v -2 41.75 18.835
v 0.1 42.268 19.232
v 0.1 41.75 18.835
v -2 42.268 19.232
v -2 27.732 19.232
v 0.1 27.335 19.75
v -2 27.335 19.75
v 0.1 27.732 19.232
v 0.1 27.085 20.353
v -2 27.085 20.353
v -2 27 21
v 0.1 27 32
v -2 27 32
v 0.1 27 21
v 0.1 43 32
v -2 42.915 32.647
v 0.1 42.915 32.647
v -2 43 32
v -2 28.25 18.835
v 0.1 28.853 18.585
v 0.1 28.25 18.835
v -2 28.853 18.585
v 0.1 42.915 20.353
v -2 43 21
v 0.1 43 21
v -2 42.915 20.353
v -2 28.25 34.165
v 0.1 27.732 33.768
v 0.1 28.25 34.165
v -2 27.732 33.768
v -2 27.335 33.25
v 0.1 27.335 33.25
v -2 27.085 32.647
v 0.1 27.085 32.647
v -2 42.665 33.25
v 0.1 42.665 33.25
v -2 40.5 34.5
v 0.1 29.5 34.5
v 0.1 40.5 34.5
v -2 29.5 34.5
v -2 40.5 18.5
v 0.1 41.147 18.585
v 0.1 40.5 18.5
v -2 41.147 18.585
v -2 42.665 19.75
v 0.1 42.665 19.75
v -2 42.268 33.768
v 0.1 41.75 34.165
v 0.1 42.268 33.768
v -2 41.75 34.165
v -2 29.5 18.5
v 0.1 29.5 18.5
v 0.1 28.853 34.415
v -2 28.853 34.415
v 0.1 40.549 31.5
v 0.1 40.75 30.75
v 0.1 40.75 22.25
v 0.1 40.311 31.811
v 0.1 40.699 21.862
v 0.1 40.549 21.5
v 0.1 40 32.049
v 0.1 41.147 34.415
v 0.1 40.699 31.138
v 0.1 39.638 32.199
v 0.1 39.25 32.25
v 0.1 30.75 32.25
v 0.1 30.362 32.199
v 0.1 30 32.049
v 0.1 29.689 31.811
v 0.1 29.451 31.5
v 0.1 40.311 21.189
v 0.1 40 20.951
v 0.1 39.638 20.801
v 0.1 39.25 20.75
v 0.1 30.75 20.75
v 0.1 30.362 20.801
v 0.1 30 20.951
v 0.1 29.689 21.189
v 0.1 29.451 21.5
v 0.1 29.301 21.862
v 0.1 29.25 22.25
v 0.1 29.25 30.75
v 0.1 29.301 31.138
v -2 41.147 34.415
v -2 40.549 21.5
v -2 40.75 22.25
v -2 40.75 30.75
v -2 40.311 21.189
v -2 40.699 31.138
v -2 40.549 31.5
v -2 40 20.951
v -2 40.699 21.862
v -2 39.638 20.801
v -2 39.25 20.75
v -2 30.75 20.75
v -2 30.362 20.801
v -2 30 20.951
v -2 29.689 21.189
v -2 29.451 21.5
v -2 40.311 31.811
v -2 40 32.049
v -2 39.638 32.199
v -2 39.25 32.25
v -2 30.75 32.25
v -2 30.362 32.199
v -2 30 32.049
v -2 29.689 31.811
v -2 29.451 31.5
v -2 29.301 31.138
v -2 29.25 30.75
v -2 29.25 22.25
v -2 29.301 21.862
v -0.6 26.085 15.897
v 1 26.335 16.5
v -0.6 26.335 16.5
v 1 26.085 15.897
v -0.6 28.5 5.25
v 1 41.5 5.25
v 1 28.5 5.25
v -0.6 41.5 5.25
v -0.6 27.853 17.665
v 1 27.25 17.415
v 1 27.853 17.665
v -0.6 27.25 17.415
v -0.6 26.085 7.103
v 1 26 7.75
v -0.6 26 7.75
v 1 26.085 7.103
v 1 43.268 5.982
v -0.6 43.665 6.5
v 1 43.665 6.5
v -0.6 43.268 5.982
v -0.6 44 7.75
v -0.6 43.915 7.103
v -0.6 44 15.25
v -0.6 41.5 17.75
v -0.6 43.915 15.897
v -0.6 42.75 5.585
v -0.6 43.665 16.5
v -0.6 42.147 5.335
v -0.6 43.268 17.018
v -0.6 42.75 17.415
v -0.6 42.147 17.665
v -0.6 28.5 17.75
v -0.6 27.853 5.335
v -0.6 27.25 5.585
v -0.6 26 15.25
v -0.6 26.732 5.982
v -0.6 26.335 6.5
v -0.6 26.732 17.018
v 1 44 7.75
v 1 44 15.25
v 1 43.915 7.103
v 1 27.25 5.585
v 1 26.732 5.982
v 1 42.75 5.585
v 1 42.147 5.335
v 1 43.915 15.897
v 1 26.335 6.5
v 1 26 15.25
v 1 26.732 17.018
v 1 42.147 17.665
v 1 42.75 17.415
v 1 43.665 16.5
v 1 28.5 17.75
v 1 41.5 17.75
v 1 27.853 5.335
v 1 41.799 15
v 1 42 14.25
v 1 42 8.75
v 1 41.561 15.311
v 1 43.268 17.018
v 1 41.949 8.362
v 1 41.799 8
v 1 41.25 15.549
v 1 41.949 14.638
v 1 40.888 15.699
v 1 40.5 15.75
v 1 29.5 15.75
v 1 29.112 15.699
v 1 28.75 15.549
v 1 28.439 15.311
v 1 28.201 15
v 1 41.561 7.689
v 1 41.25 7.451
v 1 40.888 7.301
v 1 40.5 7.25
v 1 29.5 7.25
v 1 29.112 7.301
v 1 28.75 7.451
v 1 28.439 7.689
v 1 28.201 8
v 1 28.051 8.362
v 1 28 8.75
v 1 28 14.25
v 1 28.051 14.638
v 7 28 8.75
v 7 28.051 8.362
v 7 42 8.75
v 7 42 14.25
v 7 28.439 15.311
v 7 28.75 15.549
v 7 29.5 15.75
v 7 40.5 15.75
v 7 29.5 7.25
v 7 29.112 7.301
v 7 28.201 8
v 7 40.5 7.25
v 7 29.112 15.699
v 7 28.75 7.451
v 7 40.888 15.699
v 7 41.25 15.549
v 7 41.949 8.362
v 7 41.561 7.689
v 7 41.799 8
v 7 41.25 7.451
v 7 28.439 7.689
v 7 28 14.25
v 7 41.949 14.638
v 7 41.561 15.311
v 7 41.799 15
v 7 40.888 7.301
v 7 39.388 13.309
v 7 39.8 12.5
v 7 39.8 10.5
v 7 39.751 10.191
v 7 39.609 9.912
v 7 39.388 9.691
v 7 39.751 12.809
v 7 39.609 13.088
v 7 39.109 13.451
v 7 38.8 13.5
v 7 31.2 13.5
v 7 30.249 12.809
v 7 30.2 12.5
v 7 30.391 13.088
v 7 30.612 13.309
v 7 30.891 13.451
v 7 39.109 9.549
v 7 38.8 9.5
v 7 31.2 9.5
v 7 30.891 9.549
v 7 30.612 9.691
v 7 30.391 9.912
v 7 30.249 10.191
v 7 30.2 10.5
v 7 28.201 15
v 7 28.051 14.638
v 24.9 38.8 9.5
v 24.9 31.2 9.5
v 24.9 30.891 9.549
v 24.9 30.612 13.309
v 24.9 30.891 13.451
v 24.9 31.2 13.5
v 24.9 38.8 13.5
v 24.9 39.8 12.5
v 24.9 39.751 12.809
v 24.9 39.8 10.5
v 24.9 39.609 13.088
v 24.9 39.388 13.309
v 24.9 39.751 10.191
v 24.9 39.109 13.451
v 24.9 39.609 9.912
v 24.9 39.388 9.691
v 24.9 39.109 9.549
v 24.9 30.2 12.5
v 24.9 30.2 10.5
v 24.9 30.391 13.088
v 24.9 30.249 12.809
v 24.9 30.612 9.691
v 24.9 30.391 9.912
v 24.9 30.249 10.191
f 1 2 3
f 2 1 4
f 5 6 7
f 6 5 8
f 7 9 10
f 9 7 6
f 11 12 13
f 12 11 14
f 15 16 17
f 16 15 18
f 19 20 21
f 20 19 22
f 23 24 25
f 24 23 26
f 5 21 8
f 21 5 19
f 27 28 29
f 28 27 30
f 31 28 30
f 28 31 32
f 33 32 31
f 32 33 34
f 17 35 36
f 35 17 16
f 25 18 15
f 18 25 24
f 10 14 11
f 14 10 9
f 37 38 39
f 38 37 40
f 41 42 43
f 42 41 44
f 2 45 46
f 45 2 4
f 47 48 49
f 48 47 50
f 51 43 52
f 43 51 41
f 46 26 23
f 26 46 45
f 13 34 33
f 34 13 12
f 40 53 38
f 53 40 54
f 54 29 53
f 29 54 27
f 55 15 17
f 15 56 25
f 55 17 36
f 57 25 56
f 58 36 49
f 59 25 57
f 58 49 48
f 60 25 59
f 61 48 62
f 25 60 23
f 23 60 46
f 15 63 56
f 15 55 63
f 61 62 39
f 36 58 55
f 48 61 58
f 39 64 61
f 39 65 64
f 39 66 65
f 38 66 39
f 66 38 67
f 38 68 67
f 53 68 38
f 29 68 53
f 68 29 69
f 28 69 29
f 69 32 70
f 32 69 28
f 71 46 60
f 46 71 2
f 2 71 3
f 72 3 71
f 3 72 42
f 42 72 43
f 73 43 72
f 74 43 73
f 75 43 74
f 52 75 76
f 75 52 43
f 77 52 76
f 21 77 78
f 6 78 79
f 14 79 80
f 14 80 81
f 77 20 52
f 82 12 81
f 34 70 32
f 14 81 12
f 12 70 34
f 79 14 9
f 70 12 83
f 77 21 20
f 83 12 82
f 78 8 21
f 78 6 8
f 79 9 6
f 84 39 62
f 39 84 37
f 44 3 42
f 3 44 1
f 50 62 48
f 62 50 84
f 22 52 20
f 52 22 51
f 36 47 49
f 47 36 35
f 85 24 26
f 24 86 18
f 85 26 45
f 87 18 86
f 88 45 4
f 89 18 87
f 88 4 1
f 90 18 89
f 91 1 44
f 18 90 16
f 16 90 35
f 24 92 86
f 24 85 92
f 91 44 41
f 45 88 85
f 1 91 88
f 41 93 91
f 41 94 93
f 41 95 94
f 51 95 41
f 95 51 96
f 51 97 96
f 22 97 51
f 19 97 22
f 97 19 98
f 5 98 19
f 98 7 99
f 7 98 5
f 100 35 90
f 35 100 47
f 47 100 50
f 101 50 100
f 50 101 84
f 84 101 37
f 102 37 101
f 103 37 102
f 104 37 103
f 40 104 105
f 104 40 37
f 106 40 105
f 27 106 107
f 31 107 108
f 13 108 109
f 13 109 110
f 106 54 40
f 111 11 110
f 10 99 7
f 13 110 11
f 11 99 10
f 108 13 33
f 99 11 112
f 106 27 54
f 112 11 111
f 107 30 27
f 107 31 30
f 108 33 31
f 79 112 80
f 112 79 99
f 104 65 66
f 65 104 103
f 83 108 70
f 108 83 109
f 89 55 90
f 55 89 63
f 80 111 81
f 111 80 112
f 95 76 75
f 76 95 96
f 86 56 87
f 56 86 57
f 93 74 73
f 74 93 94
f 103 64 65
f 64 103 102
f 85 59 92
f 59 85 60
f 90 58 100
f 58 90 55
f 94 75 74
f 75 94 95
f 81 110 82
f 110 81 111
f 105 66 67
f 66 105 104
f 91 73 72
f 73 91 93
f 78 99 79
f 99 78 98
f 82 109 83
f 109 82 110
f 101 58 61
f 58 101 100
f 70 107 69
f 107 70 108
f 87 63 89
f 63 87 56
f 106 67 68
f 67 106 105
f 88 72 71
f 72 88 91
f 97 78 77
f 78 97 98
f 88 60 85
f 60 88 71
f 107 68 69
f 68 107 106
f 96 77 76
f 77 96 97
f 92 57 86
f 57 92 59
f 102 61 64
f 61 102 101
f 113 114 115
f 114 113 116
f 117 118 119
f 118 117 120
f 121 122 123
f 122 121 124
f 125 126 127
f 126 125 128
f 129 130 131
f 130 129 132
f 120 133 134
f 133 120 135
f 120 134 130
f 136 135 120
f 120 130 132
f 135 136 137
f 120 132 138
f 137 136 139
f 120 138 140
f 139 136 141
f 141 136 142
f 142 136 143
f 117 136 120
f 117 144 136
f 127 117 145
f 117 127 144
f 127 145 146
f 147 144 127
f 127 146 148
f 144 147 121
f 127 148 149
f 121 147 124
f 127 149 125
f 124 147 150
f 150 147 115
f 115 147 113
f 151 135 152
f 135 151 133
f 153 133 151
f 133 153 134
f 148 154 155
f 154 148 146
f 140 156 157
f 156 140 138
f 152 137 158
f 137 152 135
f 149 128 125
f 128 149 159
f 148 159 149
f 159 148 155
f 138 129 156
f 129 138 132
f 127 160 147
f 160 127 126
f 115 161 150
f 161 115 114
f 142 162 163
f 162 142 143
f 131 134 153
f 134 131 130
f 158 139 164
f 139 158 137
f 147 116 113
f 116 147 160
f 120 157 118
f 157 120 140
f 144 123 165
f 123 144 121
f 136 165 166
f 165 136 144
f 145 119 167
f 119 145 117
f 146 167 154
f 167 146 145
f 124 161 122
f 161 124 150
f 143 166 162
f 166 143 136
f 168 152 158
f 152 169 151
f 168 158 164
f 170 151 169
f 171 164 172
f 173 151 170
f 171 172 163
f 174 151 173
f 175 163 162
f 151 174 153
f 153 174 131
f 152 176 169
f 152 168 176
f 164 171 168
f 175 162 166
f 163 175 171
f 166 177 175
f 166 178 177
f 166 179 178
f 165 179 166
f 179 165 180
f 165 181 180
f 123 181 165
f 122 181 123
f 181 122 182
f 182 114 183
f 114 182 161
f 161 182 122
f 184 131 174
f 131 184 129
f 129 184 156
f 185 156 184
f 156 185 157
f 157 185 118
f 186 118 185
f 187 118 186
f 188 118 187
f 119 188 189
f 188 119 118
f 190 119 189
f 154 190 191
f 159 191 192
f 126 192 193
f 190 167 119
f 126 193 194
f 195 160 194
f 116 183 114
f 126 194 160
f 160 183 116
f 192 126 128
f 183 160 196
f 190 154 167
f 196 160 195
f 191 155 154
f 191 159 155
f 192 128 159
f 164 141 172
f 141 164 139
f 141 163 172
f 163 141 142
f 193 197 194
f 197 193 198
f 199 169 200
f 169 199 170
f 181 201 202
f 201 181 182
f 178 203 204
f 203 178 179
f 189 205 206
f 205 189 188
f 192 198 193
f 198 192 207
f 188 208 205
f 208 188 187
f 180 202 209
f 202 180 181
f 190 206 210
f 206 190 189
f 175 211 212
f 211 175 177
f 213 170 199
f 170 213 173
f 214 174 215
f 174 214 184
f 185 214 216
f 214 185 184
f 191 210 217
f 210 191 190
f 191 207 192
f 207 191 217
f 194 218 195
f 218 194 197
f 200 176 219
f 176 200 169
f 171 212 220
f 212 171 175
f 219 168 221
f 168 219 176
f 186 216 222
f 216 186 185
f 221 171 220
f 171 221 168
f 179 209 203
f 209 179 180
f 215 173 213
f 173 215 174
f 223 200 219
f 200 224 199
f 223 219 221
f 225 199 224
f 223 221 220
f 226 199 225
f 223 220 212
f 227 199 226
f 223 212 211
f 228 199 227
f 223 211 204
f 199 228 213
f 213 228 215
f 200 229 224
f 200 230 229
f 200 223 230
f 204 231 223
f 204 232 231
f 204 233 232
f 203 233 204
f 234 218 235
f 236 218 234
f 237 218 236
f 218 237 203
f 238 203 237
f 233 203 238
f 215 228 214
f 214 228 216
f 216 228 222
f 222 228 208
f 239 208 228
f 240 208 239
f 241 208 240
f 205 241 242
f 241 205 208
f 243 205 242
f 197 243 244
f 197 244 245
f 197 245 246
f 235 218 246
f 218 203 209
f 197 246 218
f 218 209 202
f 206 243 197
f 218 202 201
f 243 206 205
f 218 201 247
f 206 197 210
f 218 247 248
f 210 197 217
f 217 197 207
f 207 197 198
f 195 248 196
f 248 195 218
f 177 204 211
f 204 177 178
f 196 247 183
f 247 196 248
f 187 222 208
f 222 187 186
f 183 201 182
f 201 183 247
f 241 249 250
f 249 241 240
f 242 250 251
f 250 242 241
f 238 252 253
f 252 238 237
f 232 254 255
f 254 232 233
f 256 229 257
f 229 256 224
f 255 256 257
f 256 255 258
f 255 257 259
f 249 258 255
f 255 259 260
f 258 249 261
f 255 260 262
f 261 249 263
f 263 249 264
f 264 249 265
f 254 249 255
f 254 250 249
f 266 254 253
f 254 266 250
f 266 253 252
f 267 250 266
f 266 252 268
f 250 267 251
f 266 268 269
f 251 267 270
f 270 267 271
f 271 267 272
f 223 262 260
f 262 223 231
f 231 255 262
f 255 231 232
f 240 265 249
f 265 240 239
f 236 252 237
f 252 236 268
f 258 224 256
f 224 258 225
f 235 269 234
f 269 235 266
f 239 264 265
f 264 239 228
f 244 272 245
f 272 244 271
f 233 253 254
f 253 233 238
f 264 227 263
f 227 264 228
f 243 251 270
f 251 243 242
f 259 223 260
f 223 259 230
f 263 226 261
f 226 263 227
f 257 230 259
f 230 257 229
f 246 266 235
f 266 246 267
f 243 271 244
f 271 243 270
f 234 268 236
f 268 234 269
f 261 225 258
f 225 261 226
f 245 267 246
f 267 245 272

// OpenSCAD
// file: ../../00_common/parameters.scad
// =============================================================================
// OpenMotorBridge - Global CAD Parameters & Settings
// =============================================================================
// File: hardware/cad/scad/00_common/parameters.scad
// Description: Global dimensional constants, manufacturing clearances and
//              circle resolution ($fn) for all OpenSCAD modules.
// =============================================================================

// --- 1. Circle & Curve Resolution ---
$fn = 60; // Smooth cylinders and holes for high-quality MJF 3D printing

// --- 2. Central Main Box Dimensions (3-Tier Sandwich) ---
MAIN_BOX_OUTER_L      = 110.0; // Outer length in X (mm)
MAIN_BOX_OUTER_W      = 74.0;  // Outer width in Y (mm)
MAIN_BOX_LOWER_H      = 17.0;  // Lower case height in Z (mm)
MAIN_BOX_MID_H        = 15.0;  // Mid tray height in Z (mm)
MAIN_BOX_LID_H        = 4.0;   // Lid plate thickness in Z (mm)
MAIN_BOX_WALL         = 2.5;   // Nominal wall thickness (mm)
MAIN_BOX_CORNER_POST  = 7.0;   // Corner clamping screw post size (mm, for M3 hex nut pockets)

// --- 3. Satellite Pod Dimensions (Universal Enlarged Envelope) ---
POD_OUTER_L           = 150.0; // Outer length in X (mm, standardized for serial PCBA 03 + Cardo/Sena/OMM)
POD_OUTER_W           = 70.0;  // Outer width in Y (mm)
POD_OUTER_H           = 38.0;  // Outer height in Z (mm)
POD_WALL              = 3.5;   // Nominal wall thickness (mm)
POD_BULKHEAD_X        = 18.0;  // Partition bulkhead position in X (mm)
POD_CHAMBER_L         = 132.0; // Sliding chamber length in X (mm, clears 130mm sled + 2mm margin)
POD_CHAMBER_W         = 63.0;  // Sliding chamber width in Y (mm)
POD_CHAMBER_H         = 31.0;  // Sliding chamber height in Z (mm)

// --- 4. Pod Linear Guide Rails (Poka-Yoke Tongue & Groove) ---
POD_GROOVE_W          = 3.0;   // Internal guide groove width in Z (mm)
POD_GROOVE_DEPTH      = 1.5;   // Internal guide groove depth in Y (mm)
POD_GROOVE_LEFT_Z     = 10.0;  // Center height of left groove (mm)
POD_GROOVE_RIGHT_Z    = 18.0;  // Center height of right groove (mm, asym offset)

CARTRIDGE_TONGUE_W    = 2.6;   // Cartridge tongue rail height in Z (mm, 0.2mm clearance)
CARTRIDGE_TONGUE_PROT = 1.4;   // Cartridge tongue protrusion in Y (mm, 0.1mm clearance)
CARTRIDGE_CHAMFER_L   = 4.0;   // 30° lead-in chamfer nose length (mm)

// --- 5. Cartridge Dimensions (Enlarged Universal Sled) ---
CARTRIDGE_BASE_L      = 130.0; // Sled length in X (mm, accommodates PCBA 03 + OEM Cardo Air-Mount/Sena/OMM serial layout)
CARTRIDGE_BASE_W      = 58.0;  // Sled width in Y (mm)
CARTRIDGE_BASE_H      = 28.0;  // Sled height in Z (mm)
CARTRIDGE_FACE_L      = 4.0;   // Front faceplate thickness in X (mm)
CARTRIDGE_FACE_W      = 64.0;  // Front faceplate width in Y (mm)
CARTRIDGE_FACE_H      = 34.0;  // Front faceplate height in Z (mm)

// --- 5a. RF Interface & Sealing Dimensions ---
SMA_BORE_R            = 3.25;  // Ø 6.5 mm through-hole for standard SMA bulkhead
SMA_ORECESS_R         = 4.75;  // Ø 9.5 mm recess for waterproof silicone O-ring
SMA_ORECESS_DEPTH     = 1.2;   // 1.2 mm deep O-ring compression pocket

// --- 5b. Magnetic Anti-Theft Lock System ---
LATCH_PIVOT_X         = 65.0;  // Center pivot position along sled X (mm, centered on 130mm sled)
LATCH_MAGNET_X        = 53.0;  // Ferromagnetic anchor position along sled X (mm)
LATCH_TOOTH_X         = 77.0;  // Locking sawtooth pawl position along sled X (mm)
LATCH_ARM_H           = 6.0;   // Rocker lever height in Z (mm)
LATCH_ARM_THICK       = 2.6;   // Rocker beam thickness in Y (mm)
LATCH_MAGNET_PIN_DIA  = 6.2;   // Bore for Ø 6.0 mm steel dowel pin (mm)
LATCH_SPRING_DIA      = 3.8;   // Bore for Ø 3.5 mm return compression spring (mm)

// --- 6. Standard Captive Hex Nut Pockets (DIN 934 / DIN 985 with +0.2 mm MJF/FDM clearance) ---
NUT_M2_SW             = 4.2;   // M2 across flats (nominal 4.0 mm)
NUT_M2_H              = 1.8;   // M2 thickness (nominal 1.6 mm)
NUT_M2_5_SW           = 5.2;   // M2.5 across flats (nominal 5.0 mm)
NUT_M2_5_H            = 2.2;   // M2.5 thickness (nominal 2.0 mm)
NUT_M3_SW             = 5.7;   // M3 across flats (nominal 5.5 mm)
NUT_M3_H              = 2.6;   // M3 thickness (nominal 2.4 mm)
NUT_M4_SW             = 7.2;   // M4 across flats (nominal 7.0 mm)
NUT_M4_H              = 3.4;   // M4 thickness (nominal 3.2 mm)
NUT_M5_SW             = 8.2;   // M5 across flats (nominal 8.0 mm)
NUT_M5_H              = 4.2;   // M5 thickness (nominal 4.0 mm)

// Direct Plastic Thread-Forming / Self-Tapping Pilot Holes in PA12 (100% Soldering-Iron Free)
M2_PILOT_HOLE_R       = 0.85;  // Core hole for M2 screws in PA12 (Ø 1.7 mm)
M2_5_PILOT_HOLE_R     = 1.05;  // Core hole for M2.5 screws in PA12 (Ø 2.1 mm)
M3_PILOT_HOLE_R       = 1.25;  // Core hole for M3 screws in PA12 (Ø 2.5 mm)

// --- 7. Screw & Clearance Dimensions ---
M2_SCREW_HOLE_R       = 1.1;   // M2 clearance hole (r = 1.1 mm -> Ø 2.2 mm)
M2_5_SCREW_HOLE_R     = 1.4;   // M2.5 clearance hole (r = 1.4 mm -> Ø 2.8 mm)
M3_SCREW_HOLE_R       = 1.65;  // M3 clearance hole (r = 1.65 mm -> Ø 3.3 mm)
M4_SCREW_HOLE_R       = 2.2;   // M4 clearance hole (r = 2.2 mm -> Ø 4.4 mm)
M8_BORE_R             = 4.0;   // M8 cable through-bore (r = 4.0 mm -> Ø 8.0 mm)
M8_STUDS_OUTER_R      = 6.0;   // M8 neck outer radius (Ø 12.0 mm)

// --- 8. Universal Front Node Enclosure Dimensions (Type E: 98 x 68 x 25 mm) ---
FRONT_NODE_PCB_L      = 82.0;  // PCB length in X (mm, PCBA 05)
FRONT_NODE_PCB_W      = 50.0;  // PCB width in Y (mm, PCBA 05)
FRONT_NODE_PCB_H      = 1.6;   // PCB thickness in Z (mm)
FRONT_NODE_PCB_R      = 2.5;   // PCB corner radius (mm)

FRONT_NODE_CHAMBER_L  = 86.0;  // Internal chamber length in X (mm, 2mm margin per side)
FRONT_NODE_CHAMBER_W  = 56.0;  // Internal chamber width in Y (mm, 3mm margin per side)
FRONT_NODE_TUB_H      = 17.5;  // Lower tub depth in Z (mm)
FRONT_NODE_LID_H      = 7.5;   // Upper lid height in Z (mm)
FRONT_NODE_WALL       = 2.5;   // Wall thickness in HP MJF PA12 (mm)
FRONT_NODE_CORNER_R   = 4.0;   // Outer enclosure corner radius (mm)

FRONT_NODE_OUTER_L    = FRONT_NODE_CHAMBER_L + 2 * FRONT_NODE_WALL + 7.0; // 98.0 mm
FRONT_NODE_OUTER_W    = FRONT_NODE_CHAMBER_W + 2 * FRONT_NODE_WALL + 7.0; // 68.0 mm
FRONT_NODE_OUTER_H    = FRONT_NODE_TUB_H + FRONT_NODE_LID_H;              // 25.0 mm

// PCB Standoff Heights & Radii (100% Soldering-Iron Free)
FRONT_NODE_STANDOFF_H = 3.0;   // Height of PCB standoffs from floor (mm)
FRONT_NODE_STANDOFF_R = 3.0;   // Outer radius of M2.5 screw bosses (mm)
FRONT_NODE_CORE_HOLE_R= M2_5_PILOT_HOLE_R; // Core hole for direct M2.5 screw engagement (Ø 2.1 mm)

// AMPS 4-Hole Mounting Pattern (38 x 30 mm with DIN 934 M4 Captive Nut Pockets)
AMPS_SPACING_X        = 38.0;  // AMPS hole distance in X (mm)
AMPS_SPACING_Y        = 30.0;  // AMPS hole distance in Y (mm)
AMPS_NUT_SW           = NUT_M4_SW; // Captive M4 hex nut pocket across flats (7.2 mm)
AMPS_NUT_H            = NUT_M4_H;  // Captive M4 hex nut pocket depth (3.4 mm)

// Acoustic Vent for Knowles SPH0645 MEMS
FRONT_NODE_MIC_HOLE_R = 1.25;  // Sound canal radius (Ø 2.5 mm)
FRONT_NODE_MIC_MEMB_R = 3.0;   // Gore ePTFE membrane pocket radius (Ø 6.0 mm)
FRONT_NODE_MIC_MEMB_D = 0.8;   // Membrane pocket depth (mm)
// main file
// =============================================================================
// OpenMotorBridge - Satellite Pod: Rear Dual-Port Glands & Pockets (Port A & B)
// =============================================================================
// File: hardware/cad/scad/02_pod_base/parts/001_pod_rear_m8_gland.scad
// Description: Parametric features for Dual-Port architecture on pod rear wall:
//              - Port A: Square pass-through opening (11.5 x 11.5 mm) allowing
//                the massive square base of the M8 PCB receptacle to pass through
//                the rear wall without requiring extra pod length or interior space.
//              - Port B: Deep recessed USB-C socket pocket (14.0 x 8.5 x 7.0 mm)
//                with 45° lead-in chamfer and internal isolating sleeve boss.
//              - Sealing pocket for flush TPU dust plug (pod_base_usbc_cap_tpu).
// =============================================================================

include <../../00_common/parameters.scad>;

// 1. Port A: Low-Profile M8 Collar / Outer Sealing Shoulder (X = -2.0 .. 0.0 mm)
module pod_rear_m8_neck(collar_len=2.0, outer_size=16.0, inner_size=11.5, r_corner=1.5, yc=35.0, zc=26.5) {
    translate([-collar_len, yc, zc]) {
        difference() {
            rotate([0, 90, 0])
                hull() {
                    translate([-(outer_size/2 - 2.5), -(outer_size/2 - 2.5), 0])
                        cylinder(r=2.5, h=collar_len + 0.1, center=false, $fn=24);
                    translate([(outer_size/2 - 2.5), -(outer_size/2 - 2.5), 0])
                        cylinder(r=2.5, h=collar_len + 0.1, center=false, $fn=24);
                    translate([-(outer_size/2 - 2.5), (outer_size/2 - 2.5), 0])
                        cylinder(r=2.5, h=collar_len + 0.1, center=false, $fn=24);
                    translate([(outer_size/2 - 2.5), (outer_size/2 - 2.5), 0])
                        cylinder(r=2.5, h=collar_len + 0.1, center=false, $fn=24);
                }
            translate([-0.1, 0, 0])
                rotate([0, 90, 0])
                    hull() {
                        translate([-(inner_size/2 - r_corner), -(inner_size/2 - r_corner), 0])
                            cylinder(r=r_corner, h=collar_len + 0.5, center=false, $fn=24);
                        translate([(inner_size/2 - r_corner), -(inner_size/2 - r_corner), 0])
                            cylinder(r=r_corner, h=collar_len + 0.5, center=false, $fn=24);
                        translate([-(inner_size/2 - r_corner), (inner_size/2 - r_corner), 0])
                            cylinder(r=r_corner, h=collar_len + 0.5, center=false, $fn=24);
                        translate([(inner_size/2 - r_corner), (inner_size/2 - r_corner), 0])
                            cylinder(r=r_corner, h=collar_len + 0.5, center=false, $fn=24);
                    }
        }
    }
}

// 2. Port A: Rear Wall Cutout Tool for M8 Square Base Pass-Through
//    (11.5 x 11.5 mm with R = 1.5 mm corner radius; cuts cleanly through 3.5 mm rear wall)
module pod_rear_m8_through_hole_tool(wall_th=8.0, base_size=11.5, r_corner=1.5, yc=35.0, zc=26.5) {
    translate([-2.5, yc, zc]) {
        rotate([0, 90, 0])
            hull() {
                translate([-(base_size/2 - r_corner), -(base_size/2 - r_corner), 0])
                    cylinder(r=r_corner, h=wall_th + 3.0, center=false, $fn=24);
                translate([(base_size/2 - r_corner), -(base_size/2 - r_corner), 0])
                    cylinder(r=r_corner, h=wall_th + 3.0, center=false, $fn=24);
                translate([-(base_size/2 - r_corner), (base_size/2 - r_corner), 0])
                    cylinder(r=r_corner, h=wall_th + 3.0, center=false, $fn=24);
                translate([(base_size/2 - r_corner), (base_size/2 - r_corner), 0])
                    cylinder(r=r_corner, h=wall_th + 3.0, center=false, $fn=24);
            }
    }
}

// 3. Port B: Internal Enclosing Sleeve Boss (Seals rear chamber around USB-C tunnel to PCB at X=16.4)
module pod_rear_usbc_internal_sleeve(
    depth=14.0,
    outer_w=17.0,
    outer_h=11.5,
    yc=35.0,
    zc=11.5
) {
    translate([0, yc, zc]) {
        rotate([0, 90, 0])
            hull() {
                translate([-(outer_h/2 - 2.0), -(outer_w/2 - 2.0), 0])
                    cylinder(r=2.0, h=depth, center=false, $fn=24);
                translate([(outer_h/2 - 2.0), -(outer_w/2 - 2.0), 0])
                    cylinder(r=2.0, h=depth, center=false, $fn=24);
                translate([-(outer_h/2 - 2.0), (outer_w/2 - 2.0), 0])
                    cylinder(r=2.0, h=depth, center=false, $fn=24);
                translate([(outer_h/2 - 2.0), (outer_w/2 - 2.0), 0])
                    cylinder(r=2.0, h=depth, center=false, $fn=24);
            }
    }
}

// 4. Port B: Recessed USB-C Vertical Socket Plug-Well & Pass-Through Tool
module pod_rear_usbc_pocket_tool(
    wall_th=18.0,
    pocket_depth=7.0,
    pocket_w=14.0,
    pocket_h=8.5,
    port_w=9.6,
    port_h=4.0,
    yc=35.0,
    zc=11.5
) {
    // A. 45° Lead-in Chamfer at outer mouth (X = -0.5 .. 1.0 mm)
    translate([-0.6, yc, zc]) {
        rotate([0, 90, 0])
            hull() {
                translate([-(pocket_h/2 - 0.5), -(pocket_w/2 - 0.5), 0])
                    cylinder(r=2.5, h=1.6, center=false, $fn=24);
                translate([(pocket_h/2 - 0.5), -(pocket_w/2 - 0.5), 0])
                    cylinder(r=2.5, h=1.6, center=false, $fn=24);
                translate([-(pocket_h/2 - 0.5), (pocket_w/2 - 0.5), 0])
                    cylinder(r=2.5, h=1.6, center=false, $fn=24);
                translate([(pocket_h/2 - 0.5), (pocket_w/2 - 0.5), 0])
                    cylinder(r=2.5, h=1.6, center=false, $fn=24);
            }
    }

    // B. Recessed Plug-Well on Rear Exterior (7.0 mm deep: accepts USB-C cable overmold)
    translate([-0.5, yc, zc]) {
        rotate([0, 90, 0])
            hull() {
                translate([-(pocket_h/2 - 1.5), -(pocket_w/2 - 1.5), 0])
                    cylinder(r=1.5, h=pocket_depth + 0.5, center=false, $fn=24);
                translate([(pocket_h/2 - 1.5), -(pocket_w/2 - 1.5), 0])
                    cylinder(r=1.5, h=pocket_depth + 0.5, center=false, $fn=24);
                translate([-(pocket_h/2 - 1.5), (pocket_w/2 - 1.5), 0])
                    cylinder(r=1.5, h=pocket_depth + 0.5, center=false, $fn=24);
                translate([(pocket_h/2 - 1.5), (pocket_w/2 - 1.5), 0])
                    cylinder(r=1.5, h=pocket_depth + 0.5, center=false, $fn=24);
            }
    }

    // C. Inner Receptacle Seat Tunnel (meets the 9.5 mm vertical USB-C socket on the PCB at x = 16.4)
    translate([pocket_depth - 0.1, yc, zc]) {
        rotate([0, 90, 0])
            hull() {
                translate([-(port_h/2 - 1.0), -(port_w/2 - 1.0), 0])
                    cylinder(r=1.0, h=wall_th, center=false, $fn=20);
                translate([(port_h/2 - 1.0), -(port_w/2 - 1.0), 0])
                    cylinder(r=1.0, h=wall_th, center=false, $fn=20);
                translate([-(port_h/2 - 1.0), (port_w/2 - 1.0), 0])
                    cylinder(r=1.0, h=wall_th, center=false, $fn=20);
                translate([(port_h/2 - 1.0), (port_w/2 - 1.0), 0])
                    cylinder(r=1.0, h=wall_th, center=false, $fn=20);
            }
    }
}

// Standalone preview
union() {
    pod_rear_m8_neck(yc=35.0, zc=26.5);
    #pod_rear_usbc_pocket_tool(yc=35.0, zc=11.5);
}
